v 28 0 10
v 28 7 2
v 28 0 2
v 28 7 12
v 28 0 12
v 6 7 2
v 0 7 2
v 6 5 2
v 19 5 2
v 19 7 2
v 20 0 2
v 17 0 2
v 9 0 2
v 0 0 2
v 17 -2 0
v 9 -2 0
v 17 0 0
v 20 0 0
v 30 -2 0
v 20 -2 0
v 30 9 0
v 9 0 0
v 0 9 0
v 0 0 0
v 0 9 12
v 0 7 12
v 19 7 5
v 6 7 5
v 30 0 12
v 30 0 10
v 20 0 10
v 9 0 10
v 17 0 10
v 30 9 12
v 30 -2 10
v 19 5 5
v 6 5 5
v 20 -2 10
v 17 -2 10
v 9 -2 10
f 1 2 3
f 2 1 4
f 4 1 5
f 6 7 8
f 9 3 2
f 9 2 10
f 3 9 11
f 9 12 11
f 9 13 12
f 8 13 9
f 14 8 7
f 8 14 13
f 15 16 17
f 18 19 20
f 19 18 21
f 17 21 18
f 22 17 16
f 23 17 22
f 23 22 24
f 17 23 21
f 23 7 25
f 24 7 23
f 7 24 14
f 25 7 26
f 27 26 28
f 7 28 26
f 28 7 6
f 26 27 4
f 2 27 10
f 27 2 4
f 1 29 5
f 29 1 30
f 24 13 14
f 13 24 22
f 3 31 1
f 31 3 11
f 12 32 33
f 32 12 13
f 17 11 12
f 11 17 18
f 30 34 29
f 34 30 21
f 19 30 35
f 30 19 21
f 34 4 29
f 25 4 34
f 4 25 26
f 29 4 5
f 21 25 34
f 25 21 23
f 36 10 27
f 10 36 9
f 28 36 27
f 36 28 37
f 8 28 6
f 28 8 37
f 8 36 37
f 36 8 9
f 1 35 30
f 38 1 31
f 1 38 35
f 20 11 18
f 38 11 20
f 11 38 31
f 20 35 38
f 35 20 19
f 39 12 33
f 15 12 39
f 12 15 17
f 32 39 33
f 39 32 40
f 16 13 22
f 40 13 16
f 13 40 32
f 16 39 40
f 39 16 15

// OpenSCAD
// -*- coding: utf-8 -*-

L = 28;
b = 7;
t = 2;
d_bottom = 12;

// inner backplate
L_offset = 6;
L_b = 13;
L_t = 2;
L_d = 5;

// front plate
L_offset1 = 20;
L_d1 = 10;

L_offset2 = 9;
L_end = 17;


cube([L,b,t]);
// end stop
translate([L,0,0]) cube([t,b,d_bottom]);

// back plate
translate([0,b,0]) cube([L+t,t,d_bottom]);
// inner back plate
translate([L_offset,b-L_t,0]) cube([L_b,L_t,L_d]);

// front plate
translate([L_offset1,-t,0]) cube([(L+t)-L_offset1,t,L_d1]);
translate([L_offset2,-t,0]) cube([L_end - L_offset2,t,L_d1]);
